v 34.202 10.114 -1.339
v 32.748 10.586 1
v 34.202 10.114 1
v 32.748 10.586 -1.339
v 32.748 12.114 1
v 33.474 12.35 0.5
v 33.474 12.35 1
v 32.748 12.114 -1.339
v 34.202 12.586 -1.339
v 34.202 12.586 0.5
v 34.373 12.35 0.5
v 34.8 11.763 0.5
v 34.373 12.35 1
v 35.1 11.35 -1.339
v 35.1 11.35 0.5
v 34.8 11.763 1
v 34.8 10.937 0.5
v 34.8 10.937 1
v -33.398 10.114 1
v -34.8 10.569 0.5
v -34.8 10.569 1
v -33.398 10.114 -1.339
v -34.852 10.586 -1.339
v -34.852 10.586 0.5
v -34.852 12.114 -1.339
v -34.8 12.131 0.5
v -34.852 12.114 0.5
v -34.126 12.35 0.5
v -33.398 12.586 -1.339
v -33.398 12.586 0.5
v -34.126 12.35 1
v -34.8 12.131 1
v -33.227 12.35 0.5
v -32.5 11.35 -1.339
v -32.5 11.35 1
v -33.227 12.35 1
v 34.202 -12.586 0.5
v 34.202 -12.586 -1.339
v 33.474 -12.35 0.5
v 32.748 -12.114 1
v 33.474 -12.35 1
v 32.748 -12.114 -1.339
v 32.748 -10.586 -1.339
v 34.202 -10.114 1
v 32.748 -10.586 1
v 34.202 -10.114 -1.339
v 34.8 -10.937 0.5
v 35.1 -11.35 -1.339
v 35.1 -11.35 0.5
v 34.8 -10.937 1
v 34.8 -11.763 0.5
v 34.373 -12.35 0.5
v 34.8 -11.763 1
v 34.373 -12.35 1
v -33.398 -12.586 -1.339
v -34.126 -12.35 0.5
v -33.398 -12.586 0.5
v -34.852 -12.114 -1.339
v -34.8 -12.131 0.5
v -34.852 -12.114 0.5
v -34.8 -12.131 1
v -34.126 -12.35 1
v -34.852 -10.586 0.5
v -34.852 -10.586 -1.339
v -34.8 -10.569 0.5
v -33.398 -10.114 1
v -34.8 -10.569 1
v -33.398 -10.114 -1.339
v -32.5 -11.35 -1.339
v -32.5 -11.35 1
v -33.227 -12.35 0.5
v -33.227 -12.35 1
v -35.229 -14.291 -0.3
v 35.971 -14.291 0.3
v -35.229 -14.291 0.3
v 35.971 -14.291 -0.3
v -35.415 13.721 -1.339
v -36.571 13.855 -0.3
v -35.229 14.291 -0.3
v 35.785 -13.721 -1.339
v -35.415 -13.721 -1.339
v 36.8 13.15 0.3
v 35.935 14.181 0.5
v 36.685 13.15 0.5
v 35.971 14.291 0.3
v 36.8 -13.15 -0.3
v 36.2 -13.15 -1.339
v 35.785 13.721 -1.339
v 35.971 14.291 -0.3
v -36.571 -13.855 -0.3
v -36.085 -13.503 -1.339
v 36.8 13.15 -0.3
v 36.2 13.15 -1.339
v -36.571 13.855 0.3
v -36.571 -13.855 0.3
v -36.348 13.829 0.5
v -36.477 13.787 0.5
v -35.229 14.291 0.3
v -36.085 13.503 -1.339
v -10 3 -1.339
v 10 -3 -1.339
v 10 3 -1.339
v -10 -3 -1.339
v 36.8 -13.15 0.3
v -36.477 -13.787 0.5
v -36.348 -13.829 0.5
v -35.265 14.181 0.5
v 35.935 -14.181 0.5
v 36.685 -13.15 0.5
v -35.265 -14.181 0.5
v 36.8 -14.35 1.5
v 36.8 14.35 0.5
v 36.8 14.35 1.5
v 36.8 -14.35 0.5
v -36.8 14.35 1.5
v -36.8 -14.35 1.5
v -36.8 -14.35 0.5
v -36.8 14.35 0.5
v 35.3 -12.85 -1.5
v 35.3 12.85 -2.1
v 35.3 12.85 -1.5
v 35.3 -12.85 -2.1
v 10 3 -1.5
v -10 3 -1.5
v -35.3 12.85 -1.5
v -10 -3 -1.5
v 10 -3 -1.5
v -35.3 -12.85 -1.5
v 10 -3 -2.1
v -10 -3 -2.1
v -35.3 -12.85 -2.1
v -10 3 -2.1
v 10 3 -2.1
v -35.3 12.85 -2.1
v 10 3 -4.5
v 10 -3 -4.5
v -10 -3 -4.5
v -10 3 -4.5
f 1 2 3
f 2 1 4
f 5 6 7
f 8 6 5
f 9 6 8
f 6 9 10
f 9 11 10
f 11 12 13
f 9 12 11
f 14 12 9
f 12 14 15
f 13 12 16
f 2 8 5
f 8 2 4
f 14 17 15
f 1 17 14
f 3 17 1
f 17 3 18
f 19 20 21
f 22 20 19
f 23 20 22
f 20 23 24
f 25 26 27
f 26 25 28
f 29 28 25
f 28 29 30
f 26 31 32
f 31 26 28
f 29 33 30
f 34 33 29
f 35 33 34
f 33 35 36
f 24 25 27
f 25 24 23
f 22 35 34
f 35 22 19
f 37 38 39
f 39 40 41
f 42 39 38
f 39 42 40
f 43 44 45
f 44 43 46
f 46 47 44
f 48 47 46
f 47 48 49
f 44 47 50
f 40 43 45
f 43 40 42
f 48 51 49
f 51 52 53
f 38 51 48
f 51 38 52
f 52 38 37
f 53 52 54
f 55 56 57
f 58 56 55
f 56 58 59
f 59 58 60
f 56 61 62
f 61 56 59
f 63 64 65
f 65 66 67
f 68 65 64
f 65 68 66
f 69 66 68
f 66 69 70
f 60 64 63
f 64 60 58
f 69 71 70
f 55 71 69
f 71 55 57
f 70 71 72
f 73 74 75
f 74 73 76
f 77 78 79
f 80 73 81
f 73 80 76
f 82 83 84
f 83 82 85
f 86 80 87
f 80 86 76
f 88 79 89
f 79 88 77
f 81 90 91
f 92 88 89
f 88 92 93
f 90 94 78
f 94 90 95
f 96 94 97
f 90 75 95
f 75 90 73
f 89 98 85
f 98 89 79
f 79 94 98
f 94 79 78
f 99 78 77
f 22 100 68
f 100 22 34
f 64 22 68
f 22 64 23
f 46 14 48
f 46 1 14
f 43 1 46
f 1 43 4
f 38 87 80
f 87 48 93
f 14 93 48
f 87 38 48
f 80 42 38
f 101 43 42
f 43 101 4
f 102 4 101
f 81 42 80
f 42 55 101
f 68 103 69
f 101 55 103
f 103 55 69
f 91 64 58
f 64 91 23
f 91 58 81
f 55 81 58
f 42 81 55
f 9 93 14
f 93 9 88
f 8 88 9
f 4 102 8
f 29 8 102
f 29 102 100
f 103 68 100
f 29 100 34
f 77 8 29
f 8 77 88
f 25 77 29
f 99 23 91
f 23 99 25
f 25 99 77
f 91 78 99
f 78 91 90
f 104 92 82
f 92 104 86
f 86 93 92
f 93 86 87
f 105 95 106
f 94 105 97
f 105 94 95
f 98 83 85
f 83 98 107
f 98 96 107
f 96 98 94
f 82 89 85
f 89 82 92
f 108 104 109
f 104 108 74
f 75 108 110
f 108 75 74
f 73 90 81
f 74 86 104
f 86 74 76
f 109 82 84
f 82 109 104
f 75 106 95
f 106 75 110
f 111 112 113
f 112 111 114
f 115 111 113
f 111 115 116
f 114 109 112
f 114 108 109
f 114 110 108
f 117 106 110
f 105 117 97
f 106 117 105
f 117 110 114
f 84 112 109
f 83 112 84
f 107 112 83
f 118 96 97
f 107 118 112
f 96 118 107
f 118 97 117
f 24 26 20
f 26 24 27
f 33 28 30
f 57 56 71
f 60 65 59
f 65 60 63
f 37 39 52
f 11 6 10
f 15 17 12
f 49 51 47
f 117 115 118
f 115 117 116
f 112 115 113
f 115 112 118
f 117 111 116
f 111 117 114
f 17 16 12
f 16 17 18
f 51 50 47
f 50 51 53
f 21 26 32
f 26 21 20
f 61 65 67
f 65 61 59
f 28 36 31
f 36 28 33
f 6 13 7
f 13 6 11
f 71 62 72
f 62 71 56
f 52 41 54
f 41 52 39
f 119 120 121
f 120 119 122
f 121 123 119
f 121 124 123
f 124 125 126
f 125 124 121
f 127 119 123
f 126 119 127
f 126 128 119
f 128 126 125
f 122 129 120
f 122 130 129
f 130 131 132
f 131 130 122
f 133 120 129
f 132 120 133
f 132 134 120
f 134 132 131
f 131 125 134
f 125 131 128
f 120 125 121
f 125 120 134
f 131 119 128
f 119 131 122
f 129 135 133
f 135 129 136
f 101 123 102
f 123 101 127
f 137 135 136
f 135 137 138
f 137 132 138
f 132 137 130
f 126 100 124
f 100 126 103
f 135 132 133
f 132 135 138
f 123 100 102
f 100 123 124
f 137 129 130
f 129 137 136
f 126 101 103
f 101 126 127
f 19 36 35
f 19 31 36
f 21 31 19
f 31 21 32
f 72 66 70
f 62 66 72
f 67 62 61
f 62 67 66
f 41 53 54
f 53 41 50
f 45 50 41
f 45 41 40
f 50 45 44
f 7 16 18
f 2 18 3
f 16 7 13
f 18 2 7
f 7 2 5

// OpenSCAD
// Parameters
body_L = 73.6; //[36.8:147.2:0.1]
body_W = 28.7; //[14.35:57.4:0.1]
body_T = 3.0; //[1.5:6.0:0.1]
bezel_margin = 2.0; //[1.0:4.0:0.1]
bezel_T = 1.0; //[0.5:2.0:0.1]
window_L = 69.6; //[34.8:139.2:0.1]
window_W = 24.7; //[12.35:49.4:0.1]
window_recess = 0.5; //[0.2:1.5:0.1]
mount_hole_d = 2.6; //[1.5:5.0:0.1]
mount_edge_margin = 3.0; //[1.5:6.0:0.1]
connector_L = 20.0; //[10.0:40.0:0.1]
connector_W = 6.0; //[3.0:12.0:0.1]
connector_T = 4.0; //[2.0:8.0:0.1]
connector_inset = 1.0; //[0.5:3.0:0.1]
pcb_detail_T = 0.6; //[0.3:1.5:0.1]
pcb_detail_margin = 1.5; //[0.5:4.0:0.1]
corner_fillet_r = 1.2; //[0.5:3.0:0.1]
minkowski_eps = 0.6; //[0.2:1.5:0.1]

// Base Shapes
module body_core_box() {
  cube([body_L - 2*corner_fillet_r, body_W - 2*corner_fillet_r, body_T - 2*corner_fillet_r], center=true);
}

module body_fillet_sphere() {
  sphere(r=corner_fillet_r, center=true);
}

module bezel_outer() {
  translate([0, 0, body_T/2 - bezel_T/2])
    cube([body_L, body_W, bezel_T], center=true);
}

module bezel_inner_cut() {
  translate([0, 0, body_T/2 - bezel_T/2])
    cube([body_L - 2*bezel_margin, body_W - 2*bezel_margin, bezel_T + 2*minkowski_eps], center=true);
}

module window_recess_cut() {
  translate([0, 0, body_T/2 - window_recess/2])
    cube([window_L, window_W, window_recess + 2*minkowski_eps], center=true);
}

module active_window_solid() {
  translate([0, 0, body_T/2 - window_recess/2])
    cube([window_L, window_W, window_recess], center=true);
}

module mount_hole_cyl() {
  cylinder(h=body_T + 2*minkowski_eps, r=mount_hole_d/2, center=true);
}

module connector_header() {
  translate([0, 0, -body_T/2 - connector_T/2 + connector_inset])
    cube([connector_L, connector_W, connector_T], center=true);
}

module pcb_detail_plate() {
  translate([0, 0, -body_T/2 + pcb_detail_T/2 - minkowski_eps])
    cube([body_L - 2*pcb_detail_margin, body_W - 2*pcb_detail_margin, pcb_detail_T], center=true);
}

// Operations
module corner_fillets_minkowski() {
  minkowski() {
    body_core_box();
    body_fillet_sphere();
  }
}

module front_bezel_frame() {
  difference() {
    bezel_outer();
    bezel_inner_cut();
  }
}

module front_bezel_with_window_recess() {
  difference() {
    front_bezel_frame();
    window_recess_cut();
  }
}

module mounting_holes() {
  union() {
    translate([body_L/2 - mount_edge_margin, body_W/2 - mount_edge_margin, 0]) mount_hole_cyl();
    translate([-(body_L/2 - mount_edge_margin), body_W/2 - mount_edge_margin, 0]) mount_hole_cyl();
    translate([body_L/2 - mount_edge_margin, -(body_W/2 - mount_edge_margin), 0]) mount_hole_cyl();
    translate([-(body_L/2 - mount_edge_margin), -(body_W/2 - mount_edge_margin), 0]) mount_hole_cyl();
  }
}

module display_module_body_with_holes() {
  difference() {
    corner_fillets_minkowski();
    mounting_holes();
  }
}

module pcb_detailing() {
  union() {
    pcb_detail_plate();
    connector_header();
  }
}

module complete_module() {
  union() {
    display_module_body_with_holes();
    front_bezel_with_window_recess();
    active_window_solid();
    pcb_detailing();
  }
}

// Final Output
complete_module();
